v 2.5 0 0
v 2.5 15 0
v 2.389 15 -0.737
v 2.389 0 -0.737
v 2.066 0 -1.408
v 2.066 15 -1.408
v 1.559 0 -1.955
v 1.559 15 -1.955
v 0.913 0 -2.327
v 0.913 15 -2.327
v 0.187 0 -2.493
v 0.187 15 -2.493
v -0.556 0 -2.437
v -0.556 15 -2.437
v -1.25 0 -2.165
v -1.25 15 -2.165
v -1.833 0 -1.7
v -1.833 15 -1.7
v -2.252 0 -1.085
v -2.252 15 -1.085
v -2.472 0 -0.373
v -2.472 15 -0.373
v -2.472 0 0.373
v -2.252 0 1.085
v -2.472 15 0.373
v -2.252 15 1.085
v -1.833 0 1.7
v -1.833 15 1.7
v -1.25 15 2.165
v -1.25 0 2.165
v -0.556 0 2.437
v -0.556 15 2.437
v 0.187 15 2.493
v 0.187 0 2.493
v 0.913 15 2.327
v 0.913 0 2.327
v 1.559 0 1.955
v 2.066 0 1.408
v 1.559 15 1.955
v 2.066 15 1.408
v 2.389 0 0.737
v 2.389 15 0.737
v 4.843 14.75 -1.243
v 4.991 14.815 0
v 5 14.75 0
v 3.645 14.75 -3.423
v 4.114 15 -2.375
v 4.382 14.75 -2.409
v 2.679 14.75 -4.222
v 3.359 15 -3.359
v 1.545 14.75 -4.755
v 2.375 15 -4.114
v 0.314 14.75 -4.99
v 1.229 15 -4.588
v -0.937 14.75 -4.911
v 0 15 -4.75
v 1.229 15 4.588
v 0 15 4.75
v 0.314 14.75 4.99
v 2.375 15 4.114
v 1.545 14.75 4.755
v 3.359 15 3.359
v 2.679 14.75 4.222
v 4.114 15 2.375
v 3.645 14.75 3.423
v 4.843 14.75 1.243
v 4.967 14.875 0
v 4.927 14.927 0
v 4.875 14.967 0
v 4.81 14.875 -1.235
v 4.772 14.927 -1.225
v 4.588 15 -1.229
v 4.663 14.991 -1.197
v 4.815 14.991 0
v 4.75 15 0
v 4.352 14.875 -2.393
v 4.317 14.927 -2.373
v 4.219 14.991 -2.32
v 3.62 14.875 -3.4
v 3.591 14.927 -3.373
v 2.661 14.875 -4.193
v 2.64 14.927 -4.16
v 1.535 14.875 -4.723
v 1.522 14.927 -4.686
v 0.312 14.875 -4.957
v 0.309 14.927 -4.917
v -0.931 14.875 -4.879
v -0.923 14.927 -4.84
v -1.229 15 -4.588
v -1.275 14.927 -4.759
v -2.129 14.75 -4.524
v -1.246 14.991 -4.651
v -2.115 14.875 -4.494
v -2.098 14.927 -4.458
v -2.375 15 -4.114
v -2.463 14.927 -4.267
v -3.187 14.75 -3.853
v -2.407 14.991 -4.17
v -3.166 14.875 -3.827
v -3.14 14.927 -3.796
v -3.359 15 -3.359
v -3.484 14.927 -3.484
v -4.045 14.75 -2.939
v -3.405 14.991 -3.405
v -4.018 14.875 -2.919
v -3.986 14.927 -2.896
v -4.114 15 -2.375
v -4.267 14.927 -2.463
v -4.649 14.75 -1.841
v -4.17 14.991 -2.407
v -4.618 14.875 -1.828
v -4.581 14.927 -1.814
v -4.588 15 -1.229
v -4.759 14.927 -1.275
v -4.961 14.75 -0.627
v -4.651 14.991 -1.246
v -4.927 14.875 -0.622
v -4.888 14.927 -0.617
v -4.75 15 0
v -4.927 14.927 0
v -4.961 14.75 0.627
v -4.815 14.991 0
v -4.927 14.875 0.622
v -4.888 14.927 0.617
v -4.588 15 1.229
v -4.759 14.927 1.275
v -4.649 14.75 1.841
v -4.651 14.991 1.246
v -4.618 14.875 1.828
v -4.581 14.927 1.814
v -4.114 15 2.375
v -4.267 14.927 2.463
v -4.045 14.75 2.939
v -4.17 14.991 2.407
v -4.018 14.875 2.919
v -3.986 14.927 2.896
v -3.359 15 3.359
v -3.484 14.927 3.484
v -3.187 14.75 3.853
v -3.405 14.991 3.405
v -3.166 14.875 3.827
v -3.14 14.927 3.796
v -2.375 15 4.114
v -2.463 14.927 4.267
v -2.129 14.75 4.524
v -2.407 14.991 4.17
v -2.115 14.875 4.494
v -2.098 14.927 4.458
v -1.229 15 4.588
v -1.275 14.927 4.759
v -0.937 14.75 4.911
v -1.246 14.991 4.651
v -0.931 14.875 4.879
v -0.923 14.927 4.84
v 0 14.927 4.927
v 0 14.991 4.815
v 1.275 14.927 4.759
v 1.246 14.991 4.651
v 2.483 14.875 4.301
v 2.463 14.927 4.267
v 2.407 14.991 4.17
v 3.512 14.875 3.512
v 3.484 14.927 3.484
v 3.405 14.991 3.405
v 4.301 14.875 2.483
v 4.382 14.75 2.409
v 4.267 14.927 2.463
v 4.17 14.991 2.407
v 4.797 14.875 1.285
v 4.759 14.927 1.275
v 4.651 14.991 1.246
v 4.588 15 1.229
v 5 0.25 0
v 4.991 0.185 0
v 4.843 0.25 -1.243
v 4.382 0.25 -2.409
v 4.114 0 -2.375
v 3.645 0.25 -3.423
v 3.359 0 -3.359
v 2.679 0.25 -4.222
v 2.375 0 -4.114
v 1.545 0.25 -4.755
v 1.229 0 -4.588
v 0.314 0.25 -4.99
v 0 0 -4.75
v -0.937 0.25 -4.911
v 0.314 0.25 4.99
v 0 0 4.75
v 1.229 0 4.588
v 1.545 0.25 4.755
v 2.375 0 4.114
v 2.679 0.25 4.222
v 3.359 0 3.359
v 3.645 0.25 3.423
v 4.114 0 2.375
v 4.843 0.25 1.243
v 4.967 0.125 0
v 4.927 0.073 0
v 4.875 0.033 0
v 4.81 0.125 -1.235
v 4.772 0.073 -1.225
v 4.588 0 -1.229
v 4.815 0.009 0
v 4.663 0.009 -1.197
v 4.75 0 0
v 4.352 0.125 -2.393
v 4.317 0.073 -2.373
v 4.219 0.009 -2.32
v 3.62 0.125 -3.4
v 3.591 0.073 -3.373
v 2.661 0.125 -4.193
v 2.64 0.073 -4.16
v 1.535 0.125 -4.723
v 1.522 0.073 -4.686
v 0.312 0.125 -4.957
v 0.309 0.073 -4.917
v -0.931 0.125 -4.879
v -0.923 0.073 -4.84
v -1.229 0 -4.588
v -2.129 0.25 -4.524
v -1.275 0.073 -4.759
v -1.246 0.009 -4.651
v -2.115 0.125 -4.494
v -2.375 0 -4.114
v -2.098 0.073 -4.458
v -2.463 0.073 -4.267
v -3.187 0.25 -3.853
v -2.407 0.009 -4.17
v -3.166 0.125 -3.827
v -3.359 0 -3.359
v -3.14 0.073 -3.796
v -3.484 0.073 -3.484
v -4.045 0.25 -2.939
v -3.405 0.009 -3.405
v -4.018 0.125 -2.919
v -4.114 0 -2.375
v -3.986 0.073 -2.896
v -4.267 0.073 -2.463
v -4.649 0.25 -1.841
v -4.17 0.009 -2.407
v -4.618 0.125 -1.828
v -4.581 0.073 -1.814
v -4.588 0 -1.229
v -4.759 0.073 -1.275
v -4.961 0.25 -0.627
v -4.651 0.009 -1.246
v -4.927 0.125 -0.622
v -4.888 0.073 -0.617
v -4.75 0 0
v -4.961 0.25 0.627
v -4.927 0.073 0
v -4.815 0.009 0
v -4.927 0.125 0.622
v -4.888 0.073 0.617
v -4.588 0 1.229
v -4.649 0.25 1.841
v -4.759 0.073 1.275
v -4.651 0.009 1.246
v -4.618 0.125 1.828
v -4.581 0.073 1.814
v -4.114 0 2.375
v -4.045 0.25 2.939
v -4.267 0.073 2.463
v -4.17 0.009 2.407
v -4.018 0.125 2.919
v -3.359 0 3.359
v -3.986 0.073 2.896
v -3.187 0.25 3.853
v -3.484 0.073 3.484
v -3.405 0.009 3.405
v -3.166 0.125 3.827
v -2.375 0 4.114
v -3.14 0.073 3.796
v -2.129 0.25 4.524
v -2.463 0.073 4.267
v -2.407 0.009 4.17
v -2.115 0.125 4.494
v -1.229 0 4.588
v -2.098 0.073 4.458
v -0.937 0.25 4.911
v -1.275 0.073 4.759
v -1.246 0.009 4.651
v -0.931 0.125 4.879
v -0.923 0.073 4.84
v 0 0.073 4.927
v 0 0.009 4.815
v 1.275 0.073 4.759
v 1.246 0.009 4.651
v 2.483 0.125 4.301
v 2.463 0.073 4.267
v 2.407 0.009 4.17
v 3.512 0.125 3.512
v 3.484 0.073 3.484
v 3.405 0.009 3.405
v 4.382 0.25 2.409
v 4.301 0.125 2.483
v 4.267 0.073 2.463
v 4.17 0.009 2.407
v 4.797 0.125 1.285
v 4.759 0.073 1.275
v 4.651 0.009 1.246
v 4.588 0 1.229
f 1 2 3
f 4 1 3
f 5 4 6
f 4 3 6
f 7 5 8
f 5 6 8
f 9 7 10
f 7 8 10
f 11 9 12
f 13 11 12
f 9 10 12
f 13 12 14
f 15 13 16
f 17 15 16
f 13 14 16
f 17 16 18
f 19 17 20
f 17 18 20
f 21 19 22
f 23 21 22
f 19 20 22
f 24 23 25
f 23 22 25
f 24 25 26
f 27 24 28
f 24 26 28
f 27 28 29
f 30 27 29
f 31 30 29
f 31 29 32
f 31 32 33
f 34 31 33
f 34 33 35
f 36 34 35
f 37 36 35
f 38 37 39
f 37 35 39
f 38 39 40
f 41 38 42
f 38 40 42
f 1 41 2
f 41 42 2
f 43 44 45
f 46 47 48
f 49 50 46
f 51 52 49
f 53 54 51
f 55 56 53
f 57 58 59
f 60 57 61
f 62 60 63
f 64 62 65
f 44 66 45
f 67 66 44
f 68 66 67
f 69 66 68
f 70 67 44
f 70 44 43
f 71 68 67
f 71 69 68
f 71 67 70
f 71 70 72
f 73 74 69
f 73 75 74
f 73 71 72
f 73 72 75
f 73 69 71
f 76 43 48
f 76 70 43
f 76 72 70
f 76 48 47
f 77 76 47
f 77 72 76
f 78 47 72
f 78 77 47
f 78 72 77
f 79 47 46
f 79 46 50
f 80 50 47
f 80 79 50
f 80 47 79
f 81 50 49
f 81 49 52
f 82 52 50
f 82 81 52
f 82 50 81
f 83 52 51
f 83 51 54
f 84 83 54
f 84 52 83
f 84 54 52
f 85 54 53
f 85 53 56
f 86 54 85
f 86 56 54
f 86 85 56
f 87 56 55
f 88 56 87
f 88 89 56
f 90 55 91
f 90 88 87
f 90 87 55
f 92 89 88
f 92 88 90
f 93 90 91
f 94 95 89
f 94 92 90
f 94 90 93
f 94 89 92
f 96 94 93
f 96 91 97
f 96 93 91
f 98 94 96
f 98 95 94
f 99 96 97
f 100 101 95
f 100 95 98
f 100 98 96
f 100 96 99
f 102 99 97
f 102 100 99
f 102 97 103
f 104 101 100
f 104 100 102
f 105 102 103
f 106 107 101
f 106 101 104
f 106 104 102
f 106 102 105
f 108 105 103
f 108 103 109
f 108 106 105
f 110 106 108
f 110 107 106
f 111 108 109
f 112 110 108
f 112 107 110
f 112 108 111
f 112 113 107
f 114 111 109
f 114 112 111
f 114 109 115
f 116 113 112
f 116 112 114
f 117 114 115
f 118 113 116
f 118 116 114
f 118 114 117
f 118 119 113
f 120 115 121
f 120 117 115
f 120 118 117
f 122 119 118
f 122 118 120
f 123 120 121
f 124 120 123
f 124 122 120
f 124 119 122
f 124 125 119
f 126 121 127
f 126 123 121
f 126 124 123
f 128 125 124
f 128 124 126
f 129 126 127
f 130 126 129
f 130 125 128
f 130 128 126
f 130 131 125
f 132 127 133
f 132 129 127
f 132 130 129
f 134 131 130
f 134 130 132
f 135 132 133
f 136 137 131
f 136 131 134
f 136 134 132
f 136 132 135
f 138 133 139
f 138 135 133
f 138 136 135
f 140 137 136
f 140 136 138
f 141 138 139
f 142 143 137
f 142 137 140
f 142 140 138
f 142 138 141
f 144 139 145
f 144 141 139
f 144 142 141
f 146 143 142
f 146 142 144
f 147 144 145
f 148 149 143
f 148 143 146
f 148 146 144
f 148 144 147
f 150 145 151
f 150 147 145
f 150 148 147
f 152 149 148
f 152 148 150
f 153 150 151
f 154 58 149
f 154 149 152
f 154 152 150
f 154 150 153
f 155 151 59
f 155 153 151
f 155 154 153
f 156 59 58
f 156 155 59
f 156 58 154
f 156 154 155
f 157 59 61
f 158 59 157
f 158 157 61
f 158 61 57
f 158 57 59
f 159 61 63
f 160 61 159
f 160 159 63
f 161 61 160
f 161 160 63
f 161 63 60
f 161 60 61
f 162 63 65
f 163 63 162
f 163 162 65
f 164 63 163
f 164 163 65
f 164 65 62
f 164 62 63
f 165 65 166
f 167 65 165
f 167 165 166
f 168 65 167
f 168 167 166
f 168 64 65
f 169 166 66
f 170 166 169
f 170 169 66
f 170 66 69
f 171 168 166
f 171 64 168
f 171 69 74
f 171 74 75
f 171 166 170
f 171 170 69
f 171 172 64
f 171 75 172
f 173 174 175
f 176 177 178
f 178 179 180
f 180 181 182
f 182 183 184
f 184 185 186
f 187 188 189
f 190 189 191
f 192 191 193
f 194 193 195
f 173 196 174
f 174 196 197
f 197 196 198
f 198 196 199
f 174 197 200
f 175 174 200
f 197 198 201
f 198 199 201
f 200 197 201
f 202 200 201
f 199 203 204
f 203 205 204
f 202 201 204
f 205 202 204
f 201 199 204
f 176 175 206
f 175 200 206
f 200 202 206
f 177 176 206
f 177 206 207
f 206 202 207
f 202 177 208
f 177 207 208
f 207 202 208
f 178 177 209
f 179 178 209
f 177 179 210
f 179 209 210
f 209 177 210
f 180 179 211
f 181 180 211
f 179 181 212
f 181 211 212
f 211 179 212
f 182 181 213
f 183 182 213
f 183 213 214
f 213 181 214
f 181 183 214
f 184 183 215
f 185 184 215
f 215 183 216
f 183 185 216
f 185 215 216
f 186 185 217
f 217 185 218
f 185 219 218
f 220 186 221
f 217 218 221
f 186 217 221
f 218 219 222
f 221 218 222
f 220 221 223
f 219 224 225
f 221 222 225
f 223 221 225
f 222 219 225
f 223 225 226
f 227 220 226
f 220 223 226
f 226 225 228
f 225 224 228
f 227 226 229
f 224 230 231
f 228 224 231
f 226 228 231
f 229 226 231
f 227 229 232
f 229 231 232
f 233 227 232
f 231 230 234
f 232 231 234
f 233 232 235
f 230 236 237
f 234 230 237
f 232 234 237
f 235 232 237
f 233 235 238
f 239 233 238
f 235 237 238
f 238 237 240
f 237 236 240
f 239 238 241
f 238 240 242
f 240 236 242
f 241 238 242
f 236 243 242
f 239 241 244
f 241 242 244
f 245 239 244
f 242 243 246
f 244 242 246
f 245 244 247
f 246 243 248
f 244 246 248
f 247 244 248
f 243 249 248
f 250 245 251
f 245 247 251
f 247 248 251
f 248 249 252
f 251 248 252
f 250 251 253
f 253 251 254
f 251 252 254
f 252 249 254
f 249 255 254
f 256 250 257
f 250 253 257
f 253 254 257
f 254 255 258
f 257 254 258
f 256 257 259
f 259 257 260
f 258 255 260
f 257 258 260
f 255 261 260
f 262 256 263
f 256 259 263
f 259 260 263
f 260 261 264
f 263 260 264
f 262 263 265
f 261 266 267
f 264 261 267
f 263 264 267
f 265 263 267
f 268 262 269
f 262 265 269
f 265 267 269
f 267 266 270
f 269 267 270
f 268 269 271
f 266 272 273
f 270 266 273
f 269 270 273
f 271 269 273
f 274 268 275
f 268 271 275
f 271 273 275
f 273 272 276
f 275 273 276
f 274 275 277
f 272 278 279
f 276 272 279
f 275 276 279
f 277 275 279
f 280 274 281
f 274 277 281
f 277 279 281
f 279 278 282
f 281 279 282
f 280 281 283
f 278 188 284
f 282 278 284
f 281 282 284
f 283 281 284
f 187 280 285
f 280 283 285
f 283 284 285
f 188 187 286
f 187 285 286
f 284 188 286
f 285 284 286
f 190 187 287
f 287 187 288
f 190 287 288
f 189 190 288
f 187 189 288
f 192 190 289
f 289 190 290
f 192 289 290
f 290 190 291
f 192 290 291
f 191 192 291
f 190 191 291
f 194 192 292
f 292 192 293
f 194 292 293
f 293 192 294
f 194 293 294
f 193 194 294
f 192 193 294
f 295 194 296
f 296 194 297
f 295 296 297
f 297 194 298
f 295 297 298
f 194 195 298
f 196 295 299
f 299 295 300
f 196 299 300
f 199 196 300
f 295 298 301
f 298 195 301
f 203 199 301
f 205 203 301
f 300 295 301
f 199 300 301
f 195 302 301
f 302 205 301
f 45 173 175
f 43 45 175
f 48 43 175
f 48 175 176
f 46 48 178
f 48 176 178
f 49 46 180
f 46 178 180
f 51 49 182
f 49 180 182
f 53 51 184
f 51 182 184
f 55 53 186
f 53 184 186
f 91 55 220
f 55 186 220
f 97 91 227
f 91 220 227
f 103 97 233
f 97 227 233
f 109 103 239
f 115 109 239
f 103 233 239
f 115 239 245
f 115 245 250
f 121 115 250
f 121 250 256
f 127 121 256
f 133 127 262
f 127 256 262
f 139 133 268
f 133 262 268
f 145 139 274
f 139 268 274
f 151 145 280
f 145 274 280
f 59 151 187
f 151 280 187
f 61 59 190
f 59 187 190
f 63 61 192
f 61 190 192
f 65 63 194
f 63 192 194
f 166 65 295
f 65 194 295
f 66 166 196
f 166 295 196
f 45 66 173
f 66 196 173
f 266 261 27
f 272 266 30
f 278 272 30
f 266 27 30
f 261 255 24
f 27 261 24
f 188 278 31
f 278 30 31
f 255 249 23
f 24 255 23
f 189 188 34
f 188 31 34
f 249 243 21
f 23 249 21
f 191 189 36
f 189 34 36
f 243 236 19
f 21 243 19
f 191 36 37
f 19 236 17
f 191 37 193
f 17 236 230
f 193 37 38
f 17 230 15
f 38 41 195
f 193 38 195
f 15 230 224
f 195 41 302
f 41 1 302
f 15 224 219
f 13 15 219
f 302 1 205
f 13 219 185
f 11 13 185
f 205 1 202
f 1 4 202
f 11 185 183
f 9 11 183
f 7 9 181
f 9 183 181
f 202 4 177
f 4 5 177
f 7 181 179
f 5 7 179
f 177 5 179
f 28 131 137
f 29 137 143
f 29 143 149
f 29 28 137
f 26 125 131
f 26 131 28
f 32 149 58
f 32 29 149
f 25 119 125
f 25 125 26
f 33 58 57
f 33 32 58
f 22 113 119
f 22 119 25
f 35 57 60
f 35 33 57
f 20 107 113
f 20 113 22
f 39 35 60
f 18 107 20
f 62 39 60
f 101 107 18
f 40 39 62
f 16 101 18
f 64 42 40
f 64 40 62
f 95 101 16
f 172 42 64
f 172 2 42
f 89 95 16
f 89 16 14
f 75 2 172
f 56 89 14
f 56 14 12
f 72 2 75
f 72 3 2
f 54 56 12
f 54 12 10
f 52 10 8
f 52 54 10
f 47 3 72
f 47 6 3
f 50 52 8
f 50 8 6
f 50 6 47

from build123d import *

# Parameters (mm, degrees)
SKETCH1_R           = 5
BOSS_EXTRUDE1_DEPTH = 15
SKETCH2_R           = 2.5
CUT_EXTRUDE1_DEPTH  = 15
FILLET1_R           = 0.25


with BuildPart() as part:
    # Sketch1 → Boss-Extrude1 (new body)
    with BuildSketch(Plane(origin=(0, 0, 0), x_dir=(1, 0, 0), z_dir=(0, 1, 0))):
        Circle(SKETCH1_R)
    extrude(amount=BOSS_EXTRUDE1_DEPTH)

    # Sketch2 → Cut-Extrude1 (cut)
    with BuildSketch(Plane(origin=(0, 15, 0), x_dir=(1, 0, 0), z_dir=(0, 1, 0))):
        Circle(SKETCH2_R)
    extrude(amount=-CUT_EXTRUDE1_DEPTH, mode=Mode.SUBTRACT)

    # Fillet1
    fillet1_edges = [part.edges().sort_by_distance(p)[0] for p in [
        (-5, 0, 0),
        (-5, 15, 0),
    ]]
    fillet(fillet1_edges, radius=FILLET1_R)


solid = part.part
